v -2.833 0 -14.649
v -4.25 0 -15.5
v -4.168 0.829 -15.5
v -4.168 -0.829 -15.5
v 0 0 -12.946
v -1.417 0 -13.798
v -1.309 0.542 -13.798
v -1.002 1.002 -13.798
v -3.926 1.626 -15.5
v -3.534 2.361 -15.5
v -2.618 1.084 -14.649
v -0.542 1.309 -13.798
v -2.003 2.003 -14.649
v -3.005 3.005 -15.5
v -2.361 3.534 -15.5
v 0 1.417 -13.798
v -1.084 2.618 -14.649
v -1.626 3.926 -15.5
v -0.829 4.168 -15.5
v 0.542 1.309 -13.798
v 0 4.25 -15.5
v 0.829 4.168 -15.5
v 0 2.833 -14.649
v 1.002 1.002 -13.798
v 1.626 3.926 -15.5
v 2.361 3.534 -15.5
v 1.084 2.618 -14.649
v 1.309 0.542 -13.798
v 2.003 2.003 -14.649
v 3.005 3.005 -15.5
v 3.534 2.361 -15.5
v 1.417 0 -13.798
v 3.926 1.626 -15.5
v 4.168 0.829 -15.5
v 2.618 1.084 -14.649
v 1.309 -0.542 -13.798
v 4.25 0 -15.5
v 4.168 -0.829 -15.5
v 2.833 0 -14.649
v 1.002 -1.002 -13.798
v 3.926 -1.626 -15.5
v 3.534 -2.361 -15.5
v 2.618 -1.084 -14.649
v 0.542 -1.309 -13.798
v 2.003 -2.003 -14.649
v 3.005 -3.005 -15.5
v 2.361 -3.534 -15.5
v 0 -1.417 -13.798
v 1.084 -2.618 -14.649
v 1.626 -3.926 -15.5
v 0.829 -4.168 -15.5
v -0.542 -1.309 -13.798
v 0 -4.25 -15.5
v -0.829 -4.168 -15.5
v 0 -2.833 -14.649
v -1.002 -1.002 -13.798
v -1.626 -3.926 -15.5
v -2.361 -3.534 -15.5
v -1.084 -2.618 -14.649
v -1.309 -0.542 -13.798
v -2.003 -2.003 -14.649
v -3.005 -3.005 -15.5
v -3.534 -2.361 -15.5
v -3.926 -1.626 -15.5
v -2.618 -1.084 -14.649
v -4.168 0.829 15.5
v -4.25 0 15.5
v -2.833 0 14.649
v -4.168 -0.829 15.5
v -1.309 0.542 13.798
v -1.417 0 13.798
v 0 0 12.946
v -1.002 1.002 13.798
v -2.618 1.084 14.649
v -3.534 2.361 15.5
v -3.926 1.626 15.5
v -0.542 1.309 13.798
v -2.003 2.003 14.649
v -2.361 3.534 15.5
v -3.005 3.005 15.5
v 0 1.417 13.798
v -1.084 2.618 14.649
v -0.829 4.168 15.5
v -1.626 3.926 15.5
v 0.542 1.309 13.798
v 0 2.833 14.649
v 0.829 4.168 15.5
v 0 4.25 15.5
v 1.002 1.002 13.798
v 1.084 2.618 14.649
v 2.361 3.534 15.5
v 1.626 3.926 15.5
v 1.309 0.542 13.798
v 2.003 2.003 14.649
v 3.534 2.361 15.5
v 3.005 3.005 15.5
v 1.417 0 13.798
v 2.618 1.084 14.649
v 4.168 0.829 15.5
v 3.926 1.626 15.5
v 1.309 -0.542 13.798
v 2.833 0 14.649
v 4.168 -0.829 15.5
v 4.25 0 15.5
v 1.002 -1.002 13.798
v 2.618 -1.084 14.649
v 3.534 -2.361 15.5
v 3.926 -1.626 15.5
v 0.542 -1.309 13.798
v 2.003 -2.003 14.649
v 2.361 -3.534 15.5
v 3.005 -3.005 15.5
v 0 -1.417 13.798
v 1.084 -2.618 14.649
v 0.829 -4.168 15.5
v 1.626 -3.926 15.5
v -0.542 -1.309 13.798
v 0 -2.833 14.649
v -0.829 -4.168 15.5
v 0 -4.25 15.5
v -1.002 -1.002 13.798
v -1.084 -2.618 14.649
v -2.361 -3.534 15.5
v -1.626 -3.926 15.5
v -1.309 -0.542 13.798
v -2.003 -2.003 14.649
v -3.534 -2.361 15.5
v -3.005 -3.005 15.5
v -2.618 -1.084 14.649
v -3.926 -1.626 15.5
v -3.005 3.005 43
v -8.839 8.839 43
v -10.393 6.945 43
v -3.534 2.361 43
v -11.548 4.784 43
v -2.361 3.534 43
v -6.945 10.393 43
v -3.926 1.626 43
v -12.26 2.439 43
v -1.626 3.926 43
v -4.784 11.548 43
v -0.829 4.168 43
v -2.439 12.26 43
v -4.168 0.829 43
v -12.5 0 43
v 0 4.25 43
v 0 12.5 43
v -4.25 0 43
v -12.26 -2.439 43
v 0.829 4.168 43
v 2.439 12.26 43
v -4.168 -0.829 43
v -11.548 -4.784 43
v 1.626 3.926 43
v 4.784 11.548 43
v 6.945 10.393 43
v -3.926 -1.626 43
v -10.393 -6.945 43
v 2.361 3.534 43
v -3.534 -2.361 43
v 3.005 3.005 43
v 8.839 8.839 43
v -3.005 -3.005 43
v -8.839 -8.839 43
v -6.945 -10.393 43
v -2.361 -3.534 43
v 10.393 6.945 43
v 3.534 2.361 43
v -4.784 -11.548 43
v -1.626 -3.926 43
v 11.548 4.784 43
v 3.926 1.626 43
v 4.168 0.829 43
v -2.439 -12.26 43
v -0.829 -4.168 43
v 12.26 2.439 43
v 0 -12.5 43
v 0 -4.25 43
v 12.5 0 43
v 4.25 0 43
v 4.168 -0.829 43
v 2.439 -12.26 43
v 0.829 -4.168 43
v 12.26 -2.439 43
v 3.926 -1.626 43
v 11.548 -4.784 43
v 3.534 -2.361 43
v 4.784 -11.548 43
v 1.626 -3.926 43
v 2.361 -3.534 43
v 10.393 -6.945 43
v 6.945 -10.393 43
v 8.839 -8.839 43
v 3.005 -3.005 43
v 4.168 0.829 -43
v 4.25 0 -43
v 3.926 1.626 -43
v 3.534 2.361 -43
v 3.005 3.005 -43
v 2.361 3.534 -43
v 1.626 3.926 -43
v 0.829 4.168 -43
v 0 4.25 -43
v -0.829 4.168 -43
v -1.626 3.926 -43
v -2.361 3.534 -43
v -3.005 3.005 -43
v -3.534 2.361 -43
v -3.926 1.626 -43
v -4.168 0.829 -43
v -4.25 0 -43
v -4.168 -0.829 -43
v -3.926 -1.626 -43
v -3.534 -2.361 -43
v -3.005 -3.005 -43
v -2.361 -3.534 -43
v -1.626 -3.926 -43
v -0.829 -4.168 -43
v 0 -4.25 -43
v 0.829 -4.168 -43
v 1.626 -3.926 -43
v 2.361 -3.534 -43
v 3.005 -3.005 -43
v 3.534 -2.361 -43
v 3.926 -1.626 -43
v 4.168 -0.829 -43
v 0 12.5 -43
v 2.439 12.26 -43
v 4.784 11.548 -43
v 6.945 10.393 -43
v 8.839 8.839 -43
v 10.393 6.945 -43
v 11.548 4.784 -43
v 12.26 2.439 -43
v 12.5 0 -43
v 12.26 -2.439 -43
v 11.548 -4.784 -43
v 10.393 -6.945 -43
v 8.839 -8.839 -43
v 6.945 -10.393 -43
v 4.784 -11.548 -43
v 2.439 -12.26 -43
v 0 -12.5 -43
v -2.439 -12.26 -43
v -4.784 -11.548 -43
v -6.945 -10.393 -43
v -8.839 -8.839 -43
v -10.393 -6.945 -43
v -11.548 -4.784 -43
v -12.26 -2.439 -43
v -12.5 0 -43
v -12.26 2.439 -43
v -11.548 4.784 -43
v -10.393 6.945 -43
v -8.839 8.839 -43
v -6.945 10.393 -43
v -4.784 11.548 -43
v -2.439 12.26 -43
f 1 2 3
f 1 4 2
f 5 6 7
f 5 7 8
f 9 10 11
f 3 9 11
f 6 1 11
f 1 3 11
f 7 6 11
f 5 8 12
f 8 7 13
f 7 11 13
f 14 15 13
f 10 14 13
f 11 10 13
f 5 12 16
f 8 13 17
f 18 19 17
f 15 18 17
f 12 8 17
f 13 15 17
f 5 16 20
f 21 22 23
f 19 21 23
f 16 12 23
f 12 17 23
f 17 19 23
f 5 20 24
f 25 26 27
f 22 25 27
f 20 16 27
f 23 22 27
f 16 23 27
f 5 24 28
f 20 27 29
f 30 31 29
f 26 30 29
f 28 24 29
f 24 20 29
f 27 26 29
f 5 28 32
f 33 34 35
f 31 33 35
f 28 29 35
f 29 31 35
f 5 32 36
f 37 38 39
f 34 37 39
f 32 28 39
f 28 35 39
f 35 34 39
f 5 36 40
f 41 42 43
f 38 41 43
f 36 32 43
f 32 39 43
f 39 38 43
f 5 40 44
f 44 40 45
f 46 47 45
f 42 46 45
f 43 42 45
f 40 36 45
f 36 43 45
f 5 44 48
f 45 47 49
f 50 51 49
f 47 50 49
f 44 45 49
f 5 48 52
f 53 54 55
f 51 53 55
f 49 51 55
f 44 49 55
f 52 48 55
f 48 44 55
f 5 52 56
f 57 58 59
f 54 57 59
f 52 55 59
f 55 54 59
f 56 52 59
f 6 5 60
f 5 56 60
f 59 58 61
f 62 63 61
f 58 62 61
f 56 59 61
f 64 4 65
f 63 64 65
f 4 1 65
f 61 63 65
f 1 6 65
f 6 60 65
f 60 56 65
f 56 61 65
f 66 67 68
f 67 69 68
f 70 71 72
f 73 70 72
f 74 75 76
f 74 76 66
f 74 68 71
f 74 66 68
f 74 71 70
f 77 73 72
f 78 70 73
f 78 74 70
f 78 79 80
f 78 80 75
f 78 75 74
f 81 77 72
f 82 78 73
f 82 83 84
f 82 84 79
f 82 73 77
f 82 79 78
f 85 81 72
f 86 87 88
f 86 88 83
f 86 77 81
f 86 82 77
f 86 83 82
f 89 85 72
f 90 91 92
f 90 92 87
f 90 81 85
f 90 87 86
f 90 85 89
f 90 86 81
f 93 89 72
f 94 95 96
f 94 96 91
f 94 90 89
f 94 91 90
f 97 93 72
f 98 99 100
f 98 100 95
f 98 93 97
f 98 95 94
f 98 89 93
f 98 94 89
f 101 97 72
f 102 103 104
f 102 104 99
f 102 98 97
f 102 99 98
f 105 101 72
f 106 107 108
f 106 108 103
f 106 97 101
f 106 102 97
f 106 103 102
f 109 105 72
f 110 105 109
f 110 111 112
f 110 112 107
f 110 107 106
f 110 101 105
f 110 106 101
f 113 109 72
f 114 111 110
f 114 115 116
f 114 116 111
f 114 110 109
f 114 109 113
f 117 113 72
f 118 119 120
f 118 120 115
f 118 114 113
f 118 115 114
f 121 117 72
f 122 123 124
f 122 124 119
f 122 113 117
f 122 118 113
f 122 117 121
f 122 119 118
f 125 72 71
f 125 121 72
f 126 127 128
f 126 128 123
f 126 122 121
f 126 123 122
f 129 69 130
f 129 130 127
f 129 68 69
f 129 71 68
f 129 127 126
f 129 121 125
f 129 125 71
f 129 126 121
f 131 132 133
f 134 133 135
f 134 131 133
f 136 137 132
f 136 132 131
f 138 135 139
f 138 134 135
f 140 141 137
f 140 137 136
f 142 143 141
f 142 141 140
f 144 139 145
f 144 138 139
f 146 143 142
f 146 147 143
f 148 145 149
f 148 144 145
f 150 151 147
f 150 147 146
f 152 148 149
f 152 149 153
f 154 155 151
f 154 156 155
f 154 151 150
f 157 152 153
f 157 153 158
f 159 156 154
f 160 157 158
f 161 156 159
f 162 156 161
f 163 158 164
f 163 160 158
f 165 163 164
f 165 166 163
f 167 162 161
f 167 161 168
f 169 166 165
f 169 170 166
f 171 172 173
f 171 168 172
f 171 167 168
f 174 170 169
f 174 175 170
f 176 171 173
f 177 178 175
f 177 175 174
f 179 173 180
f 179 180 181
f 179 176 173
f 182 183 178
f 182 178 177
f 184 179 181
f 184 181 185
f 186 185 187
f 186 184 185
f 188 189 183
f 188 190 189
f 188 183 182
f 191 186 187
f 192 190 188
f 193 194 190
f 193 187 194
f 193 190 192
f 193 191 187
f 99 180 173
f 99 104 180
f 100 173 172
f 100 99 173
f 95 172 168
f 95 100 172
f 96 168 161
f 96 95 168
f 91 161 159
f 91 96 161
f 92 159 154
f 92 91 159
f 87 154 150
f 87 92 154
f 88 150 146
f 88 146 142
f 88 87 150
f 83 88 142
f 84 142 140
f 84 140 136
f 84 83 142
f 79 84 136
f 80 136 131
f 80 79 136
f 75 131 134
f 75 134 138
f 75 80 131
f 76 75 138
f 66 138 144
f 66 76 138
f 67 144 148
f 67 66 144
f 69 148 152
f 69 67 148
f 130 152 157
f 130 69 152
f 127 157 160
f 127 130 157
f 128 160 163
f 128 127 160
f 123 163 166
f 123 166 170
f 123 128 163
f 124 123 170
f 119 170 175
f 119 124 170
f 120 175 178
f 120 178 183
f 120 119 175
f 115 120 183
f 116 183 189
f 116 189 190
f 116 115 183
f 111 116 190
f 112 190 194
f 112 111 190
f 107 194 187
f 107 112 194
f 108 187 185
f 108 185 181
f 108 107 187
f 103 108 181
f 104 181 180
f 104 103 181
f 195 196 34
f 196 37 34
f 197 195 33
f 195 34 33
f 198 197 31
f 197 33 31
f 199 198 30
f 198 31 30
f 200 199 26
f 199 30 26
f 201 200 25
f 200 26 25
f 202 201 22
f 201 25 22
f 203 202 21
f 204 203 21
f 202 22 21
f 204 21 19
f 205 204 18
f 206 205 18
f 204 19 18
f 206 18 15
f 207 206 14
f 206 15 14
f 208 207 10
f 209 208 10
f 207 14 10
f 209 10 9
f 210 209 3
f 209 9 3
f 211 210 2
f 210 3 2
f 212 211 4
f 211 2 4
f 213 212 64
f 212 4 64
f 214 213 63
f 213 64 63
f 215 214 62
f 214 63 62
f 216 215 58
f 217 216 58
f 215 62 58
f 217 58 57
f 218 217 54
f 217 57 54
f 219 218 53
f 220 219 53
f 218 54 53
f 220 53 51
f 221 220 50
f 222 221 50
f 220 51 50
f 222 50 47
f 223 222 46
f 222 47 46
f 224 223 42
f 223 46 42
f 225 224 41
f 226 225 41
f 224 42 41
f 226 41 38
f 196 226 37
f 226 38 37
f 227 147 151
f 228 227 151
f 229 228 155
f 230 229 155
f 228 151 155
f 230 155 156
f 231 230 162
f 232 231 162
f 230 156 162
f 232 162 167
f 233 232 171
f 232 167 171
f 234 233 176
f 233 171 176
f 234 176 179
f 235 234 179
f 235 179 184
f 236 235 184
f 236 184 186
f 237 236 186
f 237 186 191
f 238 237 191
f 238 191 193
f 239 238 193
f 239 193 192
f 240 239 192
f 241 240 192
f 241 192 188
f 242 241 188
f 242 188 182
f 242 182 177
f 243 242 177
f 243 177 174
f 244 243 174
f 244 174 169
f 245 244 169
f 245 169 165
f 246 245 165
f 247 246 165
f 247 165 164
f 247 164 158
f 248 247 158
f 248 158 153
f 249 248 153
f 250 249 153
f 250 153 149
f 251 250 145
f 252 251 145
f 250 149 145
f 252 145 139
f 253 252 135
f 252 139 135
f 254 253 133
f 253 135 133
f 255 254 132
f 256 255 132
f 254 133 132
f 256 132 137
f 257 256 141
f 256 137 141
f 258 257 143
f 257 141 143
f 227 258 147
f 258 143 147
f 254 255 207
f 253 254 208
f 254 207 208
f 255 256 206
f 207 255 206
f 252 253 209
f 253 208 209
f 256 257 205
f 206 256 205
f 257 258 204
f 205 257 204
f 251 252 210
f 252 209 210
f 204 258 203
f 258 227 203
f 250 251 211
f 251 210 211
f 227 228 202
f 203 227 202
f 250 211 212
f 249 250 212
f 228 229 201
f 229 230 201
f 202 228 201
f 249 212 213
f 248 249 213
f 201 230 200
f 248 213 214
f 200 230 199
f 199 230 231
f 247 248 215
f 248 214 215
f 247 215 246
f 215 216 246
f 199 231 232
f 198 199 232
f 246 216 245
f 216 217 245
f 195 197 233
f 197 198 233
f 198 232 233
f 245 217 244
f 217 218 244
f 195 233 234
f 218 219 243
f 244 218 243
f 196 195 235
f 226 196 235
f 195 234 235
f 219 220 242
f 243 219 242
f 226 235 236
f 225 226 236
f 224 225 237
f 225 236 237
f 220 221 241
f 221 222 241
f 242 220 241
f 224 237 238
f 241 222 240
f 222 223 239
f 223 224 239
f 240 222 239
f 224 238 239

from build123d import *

# Parameters (mm, degrees)
SKETCH_2_W             = 43
SKETCH_2_H             = 12.5
HOLE_WIZARD_M101_D     = 8.5
HOLE_WIZARD_M101_DEPTH = 27.5
HOLE_WIZARD_M101_TIP   = 2.553657631


with BuildPart() as part:
    # Эскиз2 → Повернуть1 (revolve)
    with BuildSketch(Plane(origin=(0, 0, 0), x_dir=(0, 0, -1), z_dir=(1, 0, 0))):
        with Locations((21.5, 6.25)):
            Rectangle(SKETCH_2_W, SKETCH_2_H)
    revolve(axis=Axis((0, 0, 0), (0, 0, -1)))

    # Отверстие обработанное метчиком M101
    with Locations(Plane(origin=(0, 0, -43), x_dir=(-1, 0, 0), z_dir=(0, 0, -1))):
        with Locations((0, 0)):
            Hole(HOLE_WIZARD_M101_D / 2, depth=HOLE_WIZARD_M101_DEPTH)
            with Locations((0, 0, -(HOLE_WIZARD_M101_DEPTH + HOLE_WIZARD_M101_TIP / 2))):  # 118° drill point
                Cone(0, HOLE_WIZARD_M101_D / 2, HOLE_WIZARD_M101_TIP, mode=Mode.SUBTRACT)

    # Зеркальное отражение1: part across plane


with BuildPart() as part_1:
    add(part.part)
    add(part.part.mirror(Plane(origin=(0, 0, 0), x_dir=(1, 0, 0), z_dir=(0, 0, -1))))


solid = part_1.part
